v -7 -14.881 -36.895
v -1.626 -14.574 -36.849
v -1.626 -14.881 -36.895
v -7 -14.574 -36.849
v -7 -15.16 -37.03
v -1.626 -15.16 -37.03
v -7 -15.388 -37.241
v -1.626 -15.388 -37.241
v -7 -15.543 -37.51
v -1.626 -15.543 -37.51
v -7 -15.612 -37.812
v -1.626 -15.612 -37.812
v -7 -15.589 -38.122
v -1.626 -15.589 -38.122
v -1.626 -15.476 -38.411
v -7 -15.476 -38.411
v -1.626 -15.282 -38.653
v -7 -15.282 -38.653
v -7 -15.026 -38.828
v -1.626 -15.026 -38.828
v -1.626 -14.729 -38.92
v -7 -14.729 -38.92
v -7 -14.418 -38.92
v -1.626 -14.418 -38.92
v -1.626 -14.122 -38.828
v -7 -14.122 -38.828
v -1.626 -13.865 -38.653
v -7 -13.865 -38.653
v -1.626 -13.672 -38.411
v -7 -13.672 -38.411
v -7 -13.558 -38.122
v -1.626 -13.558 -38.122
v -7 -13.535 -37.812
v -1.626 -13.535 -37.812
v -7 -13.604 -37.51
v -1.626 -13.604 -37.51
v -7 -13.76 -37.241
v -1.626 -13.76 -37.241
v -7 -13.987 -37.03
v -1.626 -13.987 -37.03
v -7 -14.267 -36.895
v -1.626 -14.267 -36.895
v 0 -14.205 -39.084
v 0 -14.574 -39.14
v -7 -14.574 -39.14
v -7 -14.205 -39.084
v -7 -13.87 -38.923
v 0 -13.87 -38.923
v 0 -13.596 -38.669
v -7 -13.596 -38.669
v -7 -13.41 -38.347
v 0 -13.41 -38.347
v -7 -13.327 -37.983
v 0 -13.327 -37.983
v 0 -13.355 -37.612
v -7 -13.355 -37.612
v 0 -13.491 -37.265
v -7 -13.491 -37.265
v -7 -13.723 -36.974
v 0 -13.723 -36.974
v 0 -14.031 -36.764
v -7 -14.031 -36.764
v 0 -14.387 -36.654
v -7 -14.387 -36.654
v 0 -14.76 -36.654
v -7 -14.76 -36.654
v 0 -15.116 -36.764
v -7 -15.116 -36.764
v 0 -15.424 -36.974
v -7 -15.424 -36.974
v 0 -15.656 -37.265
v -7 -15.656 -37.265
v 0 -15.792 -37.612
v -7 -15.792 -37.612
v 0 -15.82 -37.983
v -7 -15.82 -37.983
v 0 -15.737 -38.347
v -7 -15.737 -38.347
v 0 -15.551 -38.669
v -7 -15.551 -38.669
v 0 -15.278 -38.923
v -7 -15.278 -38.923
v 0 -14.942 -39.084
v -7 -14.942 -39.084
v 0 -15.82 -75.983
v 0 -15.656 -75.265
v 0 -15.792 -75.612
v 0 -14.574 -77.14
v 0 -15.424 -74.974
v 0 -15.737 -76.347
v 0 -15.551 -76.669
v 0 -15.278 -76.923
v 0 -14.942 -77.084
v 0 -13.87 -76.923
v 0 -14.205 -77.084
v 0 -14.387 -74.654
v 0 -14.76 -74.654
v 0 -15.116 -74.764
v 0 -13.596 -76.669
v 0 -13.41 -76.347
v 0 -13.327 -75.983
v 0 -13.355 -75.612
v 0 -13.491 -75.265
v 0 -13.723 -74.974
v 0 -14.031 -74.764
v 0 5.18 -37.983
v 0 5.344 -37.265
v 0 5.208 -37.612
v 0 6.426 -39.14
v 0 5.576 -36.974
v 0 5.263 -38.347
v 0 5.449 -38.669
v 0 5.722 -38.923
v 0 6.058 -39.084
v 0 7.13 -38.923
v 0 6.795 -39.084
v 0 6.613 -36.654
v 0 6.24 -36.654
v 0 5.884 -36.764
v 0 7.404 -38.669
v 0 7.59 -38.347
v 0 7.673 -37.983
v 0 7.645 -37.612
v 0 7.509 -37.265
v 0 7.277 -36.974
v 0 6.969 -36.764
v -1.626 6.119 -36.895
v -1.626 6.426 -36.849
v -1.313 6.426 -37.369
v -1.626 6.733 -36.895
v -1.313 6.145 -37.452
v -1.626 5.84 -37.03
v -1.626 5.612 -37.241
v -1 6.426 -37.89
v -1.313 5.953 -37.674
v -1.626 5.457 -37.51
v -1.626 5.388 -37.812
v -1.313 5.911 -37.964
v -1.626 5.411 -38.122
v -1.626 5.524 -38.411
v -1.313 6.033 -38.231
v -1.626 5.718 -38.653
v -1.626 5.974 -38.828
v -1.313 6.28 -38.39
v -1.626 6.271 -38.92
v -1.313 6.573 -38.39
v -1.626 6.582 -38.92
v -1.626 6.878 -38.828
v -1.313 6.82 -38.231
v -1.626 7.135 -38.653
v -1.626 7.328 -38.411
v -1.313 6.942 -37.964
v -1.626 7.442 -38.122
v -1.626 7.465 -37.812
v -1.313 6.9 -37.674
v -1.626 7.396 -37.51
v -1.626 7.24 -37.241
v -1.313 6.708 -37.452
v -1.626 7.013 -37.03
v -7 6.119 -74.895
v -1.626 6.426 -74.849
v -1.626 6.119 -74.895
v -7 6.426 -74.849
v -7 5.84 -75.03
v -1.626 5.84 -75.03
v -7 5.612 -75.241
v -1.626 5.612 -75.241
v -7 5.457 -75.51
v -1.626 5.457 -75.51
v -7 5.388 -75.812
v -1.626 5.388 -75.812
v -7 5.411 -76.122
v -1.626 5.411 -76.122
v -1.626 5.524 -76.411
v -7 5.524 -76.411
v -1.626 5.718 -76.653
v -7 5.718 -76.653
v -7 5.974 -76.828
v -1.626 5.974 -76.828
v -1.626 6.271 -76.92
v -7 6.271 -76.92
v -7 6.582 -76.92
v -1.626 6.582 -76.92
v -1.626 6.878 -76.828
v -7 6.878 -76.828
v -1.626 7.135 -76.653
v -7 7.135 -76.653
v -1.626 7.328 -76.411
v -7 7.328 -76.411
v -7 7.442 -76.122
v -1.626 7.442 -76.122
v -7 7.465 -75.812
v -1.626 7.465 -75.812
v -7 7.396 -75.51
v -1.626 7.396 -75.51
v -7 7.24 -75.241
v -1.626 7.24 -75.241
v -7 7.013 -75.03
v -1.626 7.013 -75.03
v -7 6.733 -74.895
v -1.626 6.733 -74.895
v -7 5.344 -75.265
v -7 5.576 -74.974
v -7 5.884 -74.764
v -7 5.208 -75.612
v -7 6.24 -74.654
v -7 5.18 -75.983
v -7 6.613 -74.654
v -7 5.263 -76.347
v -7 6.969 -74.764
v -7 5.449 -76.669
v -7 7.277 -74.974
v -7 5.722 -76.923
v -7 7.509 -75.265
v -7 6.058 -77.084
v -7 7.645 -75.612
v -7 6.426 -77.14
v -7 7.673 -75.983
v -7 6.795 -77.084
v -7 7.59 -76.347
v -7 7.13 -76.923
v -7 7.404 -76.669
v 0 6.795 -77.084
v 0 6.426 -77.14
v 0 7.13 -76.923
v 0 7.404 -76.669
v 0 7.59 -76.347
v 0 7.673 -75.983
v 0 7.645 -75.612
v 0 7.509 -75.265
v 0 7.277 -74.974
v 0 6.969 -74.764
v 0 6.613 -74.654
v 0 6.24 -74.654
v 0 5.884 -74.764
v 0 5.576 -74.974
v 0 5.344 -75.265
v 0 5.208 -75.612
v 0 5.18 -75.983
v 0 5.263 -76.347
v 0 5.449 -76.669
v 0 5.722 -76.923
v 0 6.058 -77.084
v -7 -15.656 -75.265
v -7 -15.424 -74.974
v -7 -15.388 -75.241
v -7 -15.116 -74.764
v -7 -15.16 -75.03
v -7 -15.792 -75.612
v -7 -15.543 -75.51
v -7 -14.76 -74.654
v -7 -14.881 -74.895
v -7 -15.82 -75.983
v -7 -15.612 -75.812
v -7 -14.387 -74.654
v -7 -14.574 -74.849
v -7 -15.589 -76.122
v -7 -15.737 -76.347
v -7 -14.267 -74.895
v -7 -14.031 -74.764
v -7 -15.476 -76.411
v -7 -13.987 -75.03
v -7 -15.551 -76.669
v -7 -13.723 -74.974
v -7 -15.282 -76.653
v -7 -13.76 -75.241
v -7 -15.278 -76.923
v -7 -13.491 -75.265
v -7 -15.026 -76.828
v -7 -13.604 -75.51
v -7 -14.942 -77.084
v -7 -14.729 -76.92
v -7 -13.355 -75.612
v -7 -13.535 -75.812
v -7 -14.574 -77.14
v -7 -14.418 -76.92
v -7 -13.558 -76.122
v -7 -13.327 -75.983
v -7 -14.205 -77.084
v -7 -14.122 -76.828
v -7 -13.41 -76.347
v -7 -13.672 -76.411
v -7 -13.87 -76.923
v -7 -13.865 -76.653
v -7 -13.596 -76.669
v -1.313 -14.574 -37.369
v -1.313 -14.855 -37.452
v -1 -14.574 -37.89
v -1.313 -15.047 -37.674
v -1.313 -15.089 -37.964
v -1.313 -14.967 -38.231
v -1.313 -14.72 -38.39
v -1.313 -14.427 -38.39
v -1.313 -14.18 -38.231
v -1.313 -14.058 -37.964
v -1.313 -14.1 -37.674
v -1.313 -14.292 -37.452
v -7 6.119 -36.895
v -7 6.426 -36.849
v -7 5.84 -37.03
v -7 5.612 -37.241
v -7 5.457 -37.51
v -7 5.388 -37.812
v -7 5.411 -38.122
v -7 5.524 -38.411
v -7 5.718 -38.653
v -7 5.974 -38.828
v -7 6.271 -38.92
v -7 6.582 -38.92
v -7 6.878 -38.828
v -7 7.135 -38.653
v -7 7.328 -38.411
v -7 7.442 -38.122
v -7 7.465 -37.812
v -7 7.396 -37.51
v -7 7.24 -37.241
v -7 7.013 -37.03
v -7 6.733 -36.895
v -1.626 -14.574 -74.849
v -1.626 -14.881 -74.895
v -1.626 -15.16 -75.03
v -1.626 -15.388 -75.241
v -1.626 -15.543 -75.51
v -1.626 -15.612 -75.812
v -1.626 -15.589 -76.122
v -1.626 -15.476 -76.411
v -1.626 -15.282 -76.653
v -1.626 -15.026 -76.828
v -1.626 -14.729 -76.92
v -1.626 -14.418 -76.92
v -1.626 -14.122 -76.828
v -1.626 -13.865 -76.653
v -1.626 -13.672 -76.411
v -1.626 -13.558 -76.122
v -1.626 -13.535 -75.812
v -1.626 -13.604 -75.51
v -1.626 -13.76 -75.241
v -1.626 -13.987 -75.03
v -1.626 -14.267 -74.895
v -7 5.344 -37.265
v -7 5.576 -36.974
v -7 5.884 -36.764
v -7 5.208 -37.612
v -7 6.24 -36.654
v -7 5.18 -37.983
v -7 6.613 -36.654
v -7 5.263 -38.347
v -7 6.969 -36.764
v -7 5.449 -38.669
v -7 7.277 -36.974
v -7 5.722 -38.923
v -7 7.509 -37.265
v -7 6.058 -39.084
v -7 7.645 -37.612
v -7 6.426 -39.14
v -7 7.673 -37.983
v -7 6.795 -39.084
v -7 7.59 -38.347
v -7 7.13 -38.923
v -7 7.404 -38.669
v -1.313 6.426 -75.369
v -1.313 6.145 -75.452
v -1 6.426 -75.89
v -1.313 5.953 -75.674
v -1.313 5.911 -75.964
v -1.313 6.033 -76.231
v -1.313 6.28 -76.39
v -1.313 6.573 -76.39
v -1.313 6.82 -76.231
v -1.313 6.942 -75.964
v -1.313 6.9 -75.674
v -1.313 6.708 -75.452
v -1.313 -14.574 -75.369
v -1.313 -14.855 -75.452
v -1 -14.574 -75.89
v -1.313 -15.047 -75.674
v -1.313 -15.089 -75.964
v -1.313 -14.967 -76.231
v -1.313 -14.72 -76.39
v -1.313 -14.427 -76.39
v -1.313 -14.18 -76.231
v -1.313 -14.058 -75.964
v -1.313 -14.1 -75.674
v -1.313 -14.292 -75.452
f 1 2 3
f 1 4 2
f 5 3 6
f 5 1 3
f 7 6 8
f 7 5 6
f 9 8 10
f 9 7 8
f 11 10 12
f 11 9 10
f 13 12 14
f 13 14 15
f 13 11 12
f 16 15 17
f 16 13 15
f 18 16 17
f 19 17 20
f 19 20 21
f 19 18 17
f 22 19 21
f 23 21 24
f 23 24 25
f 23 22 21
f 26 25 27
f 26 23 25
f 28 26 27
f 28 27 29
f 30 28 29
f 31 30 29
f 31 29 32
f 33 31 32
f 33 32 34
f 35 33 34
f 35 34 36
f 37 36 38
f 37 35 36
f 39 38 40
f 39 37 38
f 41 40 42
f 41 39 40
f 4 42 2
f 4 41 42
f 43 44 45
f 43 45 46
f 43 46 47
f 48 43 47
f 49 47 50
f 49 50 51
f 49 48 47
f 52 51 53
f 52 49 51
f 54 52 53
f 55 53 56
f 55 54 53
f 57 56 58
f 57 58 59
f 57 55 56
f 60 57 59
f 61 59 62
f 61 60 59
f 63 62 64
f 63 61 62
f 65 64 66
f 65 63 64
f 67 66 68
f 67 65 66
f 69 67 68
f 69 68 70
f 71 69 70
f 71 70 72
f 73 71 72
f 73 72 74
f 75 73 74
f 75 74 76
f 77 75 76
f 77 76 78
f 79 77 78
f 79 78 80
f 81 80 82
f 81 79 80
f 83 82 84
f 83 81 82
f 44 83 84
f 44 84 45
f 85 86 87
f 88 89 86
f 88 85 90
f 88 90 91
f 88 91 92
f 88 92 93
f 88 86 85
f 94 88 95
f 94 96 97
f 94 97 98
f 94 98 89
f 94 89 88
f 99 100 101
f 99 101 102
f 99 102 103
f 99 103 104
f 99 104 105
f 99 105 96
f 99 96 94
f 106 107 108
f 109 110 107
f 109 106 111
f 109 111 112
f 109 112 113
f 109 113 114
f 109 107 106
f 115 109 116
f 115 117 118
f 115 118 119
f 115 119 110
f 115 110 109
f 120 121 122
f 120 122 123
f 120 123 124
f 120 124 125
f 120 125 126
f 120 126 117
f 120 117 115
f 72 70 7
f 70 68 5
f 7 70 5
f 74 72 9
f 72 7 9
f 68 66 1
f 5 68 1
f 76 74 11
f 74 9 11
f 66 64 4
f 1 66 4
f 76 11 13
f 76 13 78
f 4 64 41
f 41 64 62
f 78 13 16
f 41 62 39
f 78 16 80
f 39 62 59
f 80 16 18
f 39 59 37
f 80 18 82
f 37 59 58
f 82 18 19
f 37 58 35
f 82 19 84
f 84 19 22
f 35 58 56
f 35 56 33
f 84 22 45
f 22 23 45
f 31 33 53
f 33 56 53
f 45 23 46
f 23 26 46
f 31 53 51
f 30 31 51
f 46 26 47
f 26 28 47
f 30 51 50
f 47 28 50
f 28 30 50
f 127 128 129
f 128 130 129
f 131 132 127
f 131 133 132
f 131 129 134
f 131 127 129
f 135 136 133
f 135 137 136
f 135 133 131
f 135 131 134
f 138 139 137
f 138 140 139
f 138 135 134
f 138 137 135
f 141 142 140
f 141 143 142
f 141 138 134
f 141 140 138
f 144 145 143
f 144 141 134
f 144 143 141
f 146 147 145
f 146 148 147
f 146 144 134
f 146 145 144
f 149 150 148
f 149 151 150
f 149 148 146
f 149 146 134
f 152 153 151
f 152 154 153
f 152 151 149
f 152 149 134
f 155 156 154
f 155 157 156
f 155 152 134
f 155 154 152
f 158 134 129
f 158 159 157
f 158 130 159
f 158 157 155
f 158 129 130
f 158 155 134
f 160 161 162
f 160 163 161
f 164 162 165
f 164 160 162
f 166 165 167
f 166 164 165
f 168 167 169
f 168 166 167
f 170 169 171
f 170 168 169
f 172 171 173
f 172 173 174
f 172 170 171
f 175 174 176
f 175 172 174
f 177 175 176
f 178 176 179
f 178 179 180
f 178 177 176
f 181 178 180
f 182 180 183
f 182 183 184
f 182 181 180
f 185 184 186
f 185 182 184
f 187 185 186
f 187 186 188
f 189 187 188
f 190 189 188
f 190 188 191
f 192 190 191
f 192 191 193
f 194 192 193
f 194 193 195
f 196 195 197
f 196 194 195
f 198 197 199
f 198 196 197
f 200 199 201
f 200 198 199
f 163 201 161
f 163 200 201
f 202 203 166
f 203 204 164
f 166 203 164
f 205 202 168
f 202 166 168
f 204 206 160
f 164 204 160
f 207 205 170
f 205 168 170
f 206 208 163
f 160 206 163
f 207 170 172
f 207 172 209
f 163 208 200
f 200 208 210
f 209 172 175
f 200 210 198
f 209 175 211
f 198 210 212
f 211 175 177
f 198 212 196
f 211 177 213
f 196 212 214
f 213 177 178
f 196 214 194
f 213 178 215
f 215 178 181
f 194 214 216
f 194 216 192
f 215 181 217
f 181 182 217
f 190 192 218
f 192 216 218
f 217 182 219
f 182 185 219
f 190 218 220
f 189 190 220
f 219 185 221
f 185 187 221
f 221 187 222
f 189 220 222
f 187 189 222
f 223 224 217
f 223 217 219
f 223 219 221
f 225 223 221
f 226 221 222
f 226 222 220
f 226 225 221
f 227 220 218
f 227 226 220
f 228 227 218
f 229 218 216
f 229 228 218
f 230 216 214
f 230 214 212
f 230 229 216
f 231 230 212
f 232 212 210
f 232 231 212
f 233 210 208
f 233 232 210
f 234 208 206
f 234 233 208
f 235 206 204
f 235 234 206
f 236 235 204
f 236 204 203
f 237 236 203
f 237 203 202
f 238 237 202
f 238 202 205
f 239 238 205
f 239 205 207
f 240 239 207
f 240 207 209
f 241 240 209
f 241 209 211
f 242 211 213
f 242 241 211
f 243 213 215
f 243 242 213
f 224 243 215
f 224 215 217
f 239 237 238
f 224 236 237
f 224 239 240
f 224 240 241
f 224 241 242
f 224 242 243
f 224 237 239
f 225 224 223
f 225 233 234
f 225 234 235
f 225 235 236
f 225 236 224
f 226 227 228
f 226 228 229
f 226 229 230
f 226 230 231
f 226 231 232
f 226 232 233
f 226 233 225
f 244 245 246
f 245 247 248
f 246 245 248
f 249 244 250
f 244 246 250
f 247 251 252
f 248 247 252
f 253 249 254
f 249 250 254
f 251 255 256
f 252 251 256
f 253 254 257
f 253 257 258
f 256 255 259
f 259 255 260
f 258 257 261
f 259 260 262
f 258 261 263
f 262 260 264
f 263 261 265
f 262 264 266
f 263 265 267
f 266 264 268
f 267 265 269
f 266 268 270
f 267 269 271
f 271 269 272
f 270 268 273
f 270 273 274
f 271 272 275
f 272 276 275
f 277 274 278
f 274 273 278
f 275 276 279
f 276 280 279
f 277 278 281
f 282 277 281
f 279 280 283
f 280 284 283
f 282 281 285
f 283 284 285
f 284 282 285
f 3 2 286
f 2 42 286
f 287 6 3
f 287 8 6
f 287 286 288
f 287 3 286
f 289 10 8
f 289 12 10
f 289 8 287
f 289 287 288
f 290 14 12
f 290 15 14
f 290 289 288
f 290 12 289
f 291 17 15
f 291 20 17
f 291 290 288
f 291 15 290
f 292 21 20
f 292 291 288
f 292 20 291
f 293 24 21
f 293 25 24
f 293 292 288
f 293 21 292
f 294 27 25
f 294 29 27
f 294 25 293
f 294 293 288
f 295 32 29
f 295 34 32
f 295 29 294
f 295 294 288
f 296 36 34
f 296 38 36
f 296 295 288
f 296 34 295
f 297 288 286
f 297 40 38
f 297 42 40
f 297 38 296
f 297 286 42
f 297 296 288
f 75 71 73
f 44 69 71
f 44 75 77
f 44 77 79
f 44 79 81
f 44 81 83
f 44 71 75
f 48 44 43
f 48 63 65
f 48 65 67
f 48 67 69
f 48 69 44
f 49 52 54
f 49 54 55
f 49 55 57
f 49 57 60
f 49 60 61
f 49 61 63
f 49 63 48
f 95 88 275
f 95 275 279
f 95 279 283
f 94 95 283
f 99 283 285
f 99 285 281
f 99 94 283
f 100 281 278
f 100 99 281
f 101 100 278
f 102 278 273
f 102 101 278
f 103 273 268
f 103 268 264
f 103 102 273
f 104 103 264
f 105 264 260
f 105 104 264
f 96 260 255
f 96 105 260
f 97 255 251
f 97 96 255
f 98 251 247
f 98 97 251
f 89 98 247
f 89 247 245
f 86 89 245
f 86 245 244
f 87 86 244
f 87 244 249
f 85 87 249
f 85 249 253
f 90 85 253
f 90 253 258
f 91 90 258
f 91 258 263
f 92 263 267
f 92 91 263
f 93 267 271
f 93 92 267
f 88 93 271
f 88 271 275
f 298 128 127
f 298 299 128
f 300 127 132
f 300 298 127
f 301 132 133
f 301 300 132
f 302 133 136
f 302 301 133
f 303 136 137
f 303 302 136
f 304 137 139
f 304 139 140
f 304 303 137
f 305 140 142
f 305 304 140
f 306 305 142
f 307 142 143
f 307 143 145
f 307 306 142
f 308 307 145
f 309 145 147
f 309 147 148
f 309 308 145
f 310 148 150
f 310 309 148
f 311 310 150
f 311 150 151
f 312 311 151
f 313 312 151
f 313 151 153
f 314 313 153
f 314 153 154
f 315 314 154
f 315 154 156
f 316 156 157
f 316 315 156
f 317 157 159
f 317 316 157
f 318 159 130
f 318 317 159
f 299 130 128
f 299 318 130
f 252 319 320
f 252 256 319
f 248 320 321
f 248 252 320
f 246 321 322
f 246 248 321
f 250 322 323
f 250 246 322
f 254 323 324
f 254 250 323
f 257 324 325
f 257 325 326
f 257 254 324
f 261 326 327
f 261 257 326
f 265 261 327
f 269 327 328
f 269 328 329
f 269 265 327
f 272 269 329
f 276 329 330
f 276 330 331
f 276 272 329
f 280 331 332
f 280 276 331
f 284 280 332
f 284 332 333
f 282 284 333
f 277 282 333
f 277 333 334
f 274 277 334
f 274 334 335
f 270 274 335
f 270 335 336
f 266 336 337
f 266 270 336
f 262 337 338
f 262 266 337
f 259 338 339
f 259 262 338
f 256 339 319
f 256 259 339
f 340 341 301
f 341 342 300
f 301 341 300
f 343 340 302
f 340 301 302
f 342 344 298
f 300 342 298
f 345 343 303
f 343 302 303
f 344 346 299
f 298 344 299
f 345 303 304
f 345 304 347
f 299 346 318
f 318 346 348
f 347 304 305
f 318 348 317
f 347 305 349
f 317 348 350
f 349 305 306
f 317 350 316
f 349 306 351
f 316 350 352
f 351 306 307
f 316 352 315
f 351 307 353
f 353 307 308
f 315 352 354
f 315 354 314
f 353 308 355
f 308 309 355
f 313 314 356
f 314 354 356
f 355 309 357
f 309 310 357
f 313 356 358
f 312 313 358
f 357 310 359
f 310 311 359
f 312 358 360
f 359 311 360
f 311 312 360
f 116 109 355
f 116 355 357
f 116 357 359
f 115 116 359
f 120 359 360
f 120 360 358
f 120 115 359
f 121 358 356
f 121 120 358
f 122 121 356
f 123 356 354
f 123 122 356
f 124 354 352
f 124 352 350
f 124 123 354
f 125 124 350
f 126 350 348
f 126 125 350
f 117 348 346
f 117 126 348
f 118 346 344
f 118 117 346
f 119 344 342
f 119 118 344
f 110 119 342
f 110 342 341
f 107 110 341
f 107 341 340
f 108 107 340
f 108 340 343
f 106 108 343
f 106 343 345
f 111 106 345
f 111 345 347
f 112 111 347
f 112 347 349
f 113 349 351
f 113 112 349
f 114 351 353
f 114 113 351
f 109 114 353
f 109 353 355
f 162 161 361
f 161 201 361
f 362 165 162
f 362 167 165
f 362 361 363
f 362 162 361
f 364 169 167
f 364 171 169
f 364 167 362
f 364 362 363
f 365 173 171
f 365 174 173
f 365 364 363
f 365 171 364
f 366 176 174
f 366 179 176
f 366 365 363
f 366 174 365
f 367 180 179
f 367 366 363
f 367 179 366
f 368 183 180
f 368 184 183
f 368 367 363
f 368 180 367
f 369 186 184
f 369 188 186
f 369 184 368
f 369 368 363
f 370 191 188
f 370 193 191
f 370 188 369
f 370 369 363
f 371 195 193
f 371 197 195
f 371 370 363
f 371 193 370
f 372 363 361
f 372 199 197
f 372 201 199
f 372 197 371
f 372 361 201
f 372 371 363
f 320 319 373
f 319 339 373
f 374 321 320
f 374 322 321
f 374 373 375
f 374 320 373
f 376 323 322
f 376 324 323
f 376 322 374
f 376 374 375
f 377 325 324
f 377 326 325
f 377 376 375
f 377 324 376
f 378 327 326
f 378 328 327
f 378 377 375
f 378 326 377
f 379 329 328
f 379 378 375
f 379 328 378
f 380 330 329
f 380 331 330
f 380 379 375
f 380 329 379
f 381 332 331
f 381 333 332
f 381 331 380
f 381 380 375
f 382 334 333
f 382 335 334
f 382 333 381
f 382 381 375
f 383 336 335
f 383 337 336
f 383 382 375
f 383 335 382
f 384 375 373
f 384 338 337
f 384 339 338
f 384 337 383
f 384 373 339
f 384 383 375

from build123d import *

# Parameters (mm, degrees)
SKETCH2_R                            = 1.25
BOSS_EXTRUDE1_DEPTH                  = 7
BOSS_EXTRUDE1_2_DEPTH                = 7
BOSS_EXTRUDE1_3_DEPTH                = 7
BOSS_EXTRUDE1_4_DEPTH                = 7
F_45_0_082_DIAMETER_HOLE1_AT_2_COUNT = 2
F_45_0_082_DIAMETER_HOLE1_AT_2_PITCH = 38
F_45_0_082_DIAMETER_HOLE1_AT_3_COUNT = 2
F_45_0_082_DIAMETER_HOLE1_AT_3_PITCH = 43.416586692
F_45_0_082_DIAMETER_HOLE1_AT_4_COUNT = 2
F_45_0_082_DIAMETER_HOLE1_AT_4_PITCH = 21


with BuildPart() as part:
    # Sketch2 → Boss-Extrude1 (new body)
    with BuildSketch(Plane(origin=(0, 0, 0), x_dir=(0, 0, -1), z_dir=(1, 0, 0))):
        with Locations((75.89, 6.426291501)):
            Circle(SKETCH2_R)
    extrude(amount=-BOSS_EXTRUDE1_DEPTH)


with BuildPart() as body_2:
    # Sketch2 → Boss-Extrude1 2 (new body)
    with BuildSketch(Plane(origin=(0, 0, 0), x_dir=(0, 0, -1), z_dir=(1, 0, 0))):
        with Locations((37.89, 6.426291501)):
            Circle(SKETCH2_R)
    extrude(amount=-BOSS_EXTRUDE1_2_DEPTH)


with BuildPart() as body_3:
    # Sketch2 → Boss-Extrude1 3 (new body)
    with BuildSketch(Plane(origin=(0, 0, 0), x_dir=(0, 0, -1), z_dir=(1, 0, 0))):
        with Locations((37.89, -14.573708499)):
            Circle(SKETCH2_R)
    extrude(amount=-BOSS_EXTRUDE1_3_DEPTH)

    # Sketch4 → #45 (0.082) Diameter Hole1 (revolve, cut)
    with BuildSketch(Plane(origin=(-7, -14.573708499, -37.89), x_dir=(0, 0, 1), z_dir=(0, 1, 0))):
        Polygon((0, 0), (0, 6), (1.0414, 5.374263751), (1.0414, 0), align=None)
    f_45_0_082_diameter_hole1 = revolve(axis=Axis((-13.35, -14.573708499, -37.89), (1, 0, 0)), mode=Mode.SUBTRACT)


with BuildPart() as body_4:
    # Sketch2 → Boss-Extrude1 4 (new body)
    with BuildSketch(Plane(origin=(0, 0, 0), x_dir=(0, 0, -1), z_dir=(1, 0, 0))):
        with Locations((75.89, -14.573708499)):
            Circle(SKETCH2_R)
    extrude(amount=-BOSS_EXTRUDE1_4_DEPTH)

    # #45 (0.082) Diameter Hole1 at 2: #45 (0.082) Diameter Hole1 ×2
    with Locations(*[(0, 0, -i * F_45_0_082_DIAMETER_HOLE1_AT_2_PITCH) for i in range(1, F_45_0_082_DIAMETER_HOLE1_AT_2_COUNT)]):
        add(f_45_0_082_diameter_hole1, mode=Mode.SUBTRACT)


with BuildPart() as part_1:
    add(part.part)

    # #45 (0.082) Diameter Hole1 at 3: #45 (0.082) Diameter Hole1 ×2
    with Locations(*[Vector(0, 0.4836861116901228, -0.8752415354392695) * (i * F_45_0_082_DIAMETER_HOLE1_AT_3_PITCH) for i in range(1, F_45_0_082_DIAMETER_HOLE1_AT_3_COUNT)]):
        add(f_45_0_082_diameter_hole1, mode=Mode.SUBTRACT)


with BuildPart() as body_2_1:
    add(body_2.part)

    # #45 (0.082) Diameter Hole1 at 4: #45 (0.082) Diameter Hole1 ×2
    with Locations(*[(0, i * F_45_0_082_DIAMETER_HOLE1_AT_4_PITCH, 0) for i in range(1, F_45_0_082_DIAMETER_HOLE1_AT_4_COUNT)]):
        add(f_45_0_082_diameter_hole1, mode=Mode.SUBTRACT)


solid = Compound([body_3.part, body_4.part, part_1.part, body_2_1.part])
